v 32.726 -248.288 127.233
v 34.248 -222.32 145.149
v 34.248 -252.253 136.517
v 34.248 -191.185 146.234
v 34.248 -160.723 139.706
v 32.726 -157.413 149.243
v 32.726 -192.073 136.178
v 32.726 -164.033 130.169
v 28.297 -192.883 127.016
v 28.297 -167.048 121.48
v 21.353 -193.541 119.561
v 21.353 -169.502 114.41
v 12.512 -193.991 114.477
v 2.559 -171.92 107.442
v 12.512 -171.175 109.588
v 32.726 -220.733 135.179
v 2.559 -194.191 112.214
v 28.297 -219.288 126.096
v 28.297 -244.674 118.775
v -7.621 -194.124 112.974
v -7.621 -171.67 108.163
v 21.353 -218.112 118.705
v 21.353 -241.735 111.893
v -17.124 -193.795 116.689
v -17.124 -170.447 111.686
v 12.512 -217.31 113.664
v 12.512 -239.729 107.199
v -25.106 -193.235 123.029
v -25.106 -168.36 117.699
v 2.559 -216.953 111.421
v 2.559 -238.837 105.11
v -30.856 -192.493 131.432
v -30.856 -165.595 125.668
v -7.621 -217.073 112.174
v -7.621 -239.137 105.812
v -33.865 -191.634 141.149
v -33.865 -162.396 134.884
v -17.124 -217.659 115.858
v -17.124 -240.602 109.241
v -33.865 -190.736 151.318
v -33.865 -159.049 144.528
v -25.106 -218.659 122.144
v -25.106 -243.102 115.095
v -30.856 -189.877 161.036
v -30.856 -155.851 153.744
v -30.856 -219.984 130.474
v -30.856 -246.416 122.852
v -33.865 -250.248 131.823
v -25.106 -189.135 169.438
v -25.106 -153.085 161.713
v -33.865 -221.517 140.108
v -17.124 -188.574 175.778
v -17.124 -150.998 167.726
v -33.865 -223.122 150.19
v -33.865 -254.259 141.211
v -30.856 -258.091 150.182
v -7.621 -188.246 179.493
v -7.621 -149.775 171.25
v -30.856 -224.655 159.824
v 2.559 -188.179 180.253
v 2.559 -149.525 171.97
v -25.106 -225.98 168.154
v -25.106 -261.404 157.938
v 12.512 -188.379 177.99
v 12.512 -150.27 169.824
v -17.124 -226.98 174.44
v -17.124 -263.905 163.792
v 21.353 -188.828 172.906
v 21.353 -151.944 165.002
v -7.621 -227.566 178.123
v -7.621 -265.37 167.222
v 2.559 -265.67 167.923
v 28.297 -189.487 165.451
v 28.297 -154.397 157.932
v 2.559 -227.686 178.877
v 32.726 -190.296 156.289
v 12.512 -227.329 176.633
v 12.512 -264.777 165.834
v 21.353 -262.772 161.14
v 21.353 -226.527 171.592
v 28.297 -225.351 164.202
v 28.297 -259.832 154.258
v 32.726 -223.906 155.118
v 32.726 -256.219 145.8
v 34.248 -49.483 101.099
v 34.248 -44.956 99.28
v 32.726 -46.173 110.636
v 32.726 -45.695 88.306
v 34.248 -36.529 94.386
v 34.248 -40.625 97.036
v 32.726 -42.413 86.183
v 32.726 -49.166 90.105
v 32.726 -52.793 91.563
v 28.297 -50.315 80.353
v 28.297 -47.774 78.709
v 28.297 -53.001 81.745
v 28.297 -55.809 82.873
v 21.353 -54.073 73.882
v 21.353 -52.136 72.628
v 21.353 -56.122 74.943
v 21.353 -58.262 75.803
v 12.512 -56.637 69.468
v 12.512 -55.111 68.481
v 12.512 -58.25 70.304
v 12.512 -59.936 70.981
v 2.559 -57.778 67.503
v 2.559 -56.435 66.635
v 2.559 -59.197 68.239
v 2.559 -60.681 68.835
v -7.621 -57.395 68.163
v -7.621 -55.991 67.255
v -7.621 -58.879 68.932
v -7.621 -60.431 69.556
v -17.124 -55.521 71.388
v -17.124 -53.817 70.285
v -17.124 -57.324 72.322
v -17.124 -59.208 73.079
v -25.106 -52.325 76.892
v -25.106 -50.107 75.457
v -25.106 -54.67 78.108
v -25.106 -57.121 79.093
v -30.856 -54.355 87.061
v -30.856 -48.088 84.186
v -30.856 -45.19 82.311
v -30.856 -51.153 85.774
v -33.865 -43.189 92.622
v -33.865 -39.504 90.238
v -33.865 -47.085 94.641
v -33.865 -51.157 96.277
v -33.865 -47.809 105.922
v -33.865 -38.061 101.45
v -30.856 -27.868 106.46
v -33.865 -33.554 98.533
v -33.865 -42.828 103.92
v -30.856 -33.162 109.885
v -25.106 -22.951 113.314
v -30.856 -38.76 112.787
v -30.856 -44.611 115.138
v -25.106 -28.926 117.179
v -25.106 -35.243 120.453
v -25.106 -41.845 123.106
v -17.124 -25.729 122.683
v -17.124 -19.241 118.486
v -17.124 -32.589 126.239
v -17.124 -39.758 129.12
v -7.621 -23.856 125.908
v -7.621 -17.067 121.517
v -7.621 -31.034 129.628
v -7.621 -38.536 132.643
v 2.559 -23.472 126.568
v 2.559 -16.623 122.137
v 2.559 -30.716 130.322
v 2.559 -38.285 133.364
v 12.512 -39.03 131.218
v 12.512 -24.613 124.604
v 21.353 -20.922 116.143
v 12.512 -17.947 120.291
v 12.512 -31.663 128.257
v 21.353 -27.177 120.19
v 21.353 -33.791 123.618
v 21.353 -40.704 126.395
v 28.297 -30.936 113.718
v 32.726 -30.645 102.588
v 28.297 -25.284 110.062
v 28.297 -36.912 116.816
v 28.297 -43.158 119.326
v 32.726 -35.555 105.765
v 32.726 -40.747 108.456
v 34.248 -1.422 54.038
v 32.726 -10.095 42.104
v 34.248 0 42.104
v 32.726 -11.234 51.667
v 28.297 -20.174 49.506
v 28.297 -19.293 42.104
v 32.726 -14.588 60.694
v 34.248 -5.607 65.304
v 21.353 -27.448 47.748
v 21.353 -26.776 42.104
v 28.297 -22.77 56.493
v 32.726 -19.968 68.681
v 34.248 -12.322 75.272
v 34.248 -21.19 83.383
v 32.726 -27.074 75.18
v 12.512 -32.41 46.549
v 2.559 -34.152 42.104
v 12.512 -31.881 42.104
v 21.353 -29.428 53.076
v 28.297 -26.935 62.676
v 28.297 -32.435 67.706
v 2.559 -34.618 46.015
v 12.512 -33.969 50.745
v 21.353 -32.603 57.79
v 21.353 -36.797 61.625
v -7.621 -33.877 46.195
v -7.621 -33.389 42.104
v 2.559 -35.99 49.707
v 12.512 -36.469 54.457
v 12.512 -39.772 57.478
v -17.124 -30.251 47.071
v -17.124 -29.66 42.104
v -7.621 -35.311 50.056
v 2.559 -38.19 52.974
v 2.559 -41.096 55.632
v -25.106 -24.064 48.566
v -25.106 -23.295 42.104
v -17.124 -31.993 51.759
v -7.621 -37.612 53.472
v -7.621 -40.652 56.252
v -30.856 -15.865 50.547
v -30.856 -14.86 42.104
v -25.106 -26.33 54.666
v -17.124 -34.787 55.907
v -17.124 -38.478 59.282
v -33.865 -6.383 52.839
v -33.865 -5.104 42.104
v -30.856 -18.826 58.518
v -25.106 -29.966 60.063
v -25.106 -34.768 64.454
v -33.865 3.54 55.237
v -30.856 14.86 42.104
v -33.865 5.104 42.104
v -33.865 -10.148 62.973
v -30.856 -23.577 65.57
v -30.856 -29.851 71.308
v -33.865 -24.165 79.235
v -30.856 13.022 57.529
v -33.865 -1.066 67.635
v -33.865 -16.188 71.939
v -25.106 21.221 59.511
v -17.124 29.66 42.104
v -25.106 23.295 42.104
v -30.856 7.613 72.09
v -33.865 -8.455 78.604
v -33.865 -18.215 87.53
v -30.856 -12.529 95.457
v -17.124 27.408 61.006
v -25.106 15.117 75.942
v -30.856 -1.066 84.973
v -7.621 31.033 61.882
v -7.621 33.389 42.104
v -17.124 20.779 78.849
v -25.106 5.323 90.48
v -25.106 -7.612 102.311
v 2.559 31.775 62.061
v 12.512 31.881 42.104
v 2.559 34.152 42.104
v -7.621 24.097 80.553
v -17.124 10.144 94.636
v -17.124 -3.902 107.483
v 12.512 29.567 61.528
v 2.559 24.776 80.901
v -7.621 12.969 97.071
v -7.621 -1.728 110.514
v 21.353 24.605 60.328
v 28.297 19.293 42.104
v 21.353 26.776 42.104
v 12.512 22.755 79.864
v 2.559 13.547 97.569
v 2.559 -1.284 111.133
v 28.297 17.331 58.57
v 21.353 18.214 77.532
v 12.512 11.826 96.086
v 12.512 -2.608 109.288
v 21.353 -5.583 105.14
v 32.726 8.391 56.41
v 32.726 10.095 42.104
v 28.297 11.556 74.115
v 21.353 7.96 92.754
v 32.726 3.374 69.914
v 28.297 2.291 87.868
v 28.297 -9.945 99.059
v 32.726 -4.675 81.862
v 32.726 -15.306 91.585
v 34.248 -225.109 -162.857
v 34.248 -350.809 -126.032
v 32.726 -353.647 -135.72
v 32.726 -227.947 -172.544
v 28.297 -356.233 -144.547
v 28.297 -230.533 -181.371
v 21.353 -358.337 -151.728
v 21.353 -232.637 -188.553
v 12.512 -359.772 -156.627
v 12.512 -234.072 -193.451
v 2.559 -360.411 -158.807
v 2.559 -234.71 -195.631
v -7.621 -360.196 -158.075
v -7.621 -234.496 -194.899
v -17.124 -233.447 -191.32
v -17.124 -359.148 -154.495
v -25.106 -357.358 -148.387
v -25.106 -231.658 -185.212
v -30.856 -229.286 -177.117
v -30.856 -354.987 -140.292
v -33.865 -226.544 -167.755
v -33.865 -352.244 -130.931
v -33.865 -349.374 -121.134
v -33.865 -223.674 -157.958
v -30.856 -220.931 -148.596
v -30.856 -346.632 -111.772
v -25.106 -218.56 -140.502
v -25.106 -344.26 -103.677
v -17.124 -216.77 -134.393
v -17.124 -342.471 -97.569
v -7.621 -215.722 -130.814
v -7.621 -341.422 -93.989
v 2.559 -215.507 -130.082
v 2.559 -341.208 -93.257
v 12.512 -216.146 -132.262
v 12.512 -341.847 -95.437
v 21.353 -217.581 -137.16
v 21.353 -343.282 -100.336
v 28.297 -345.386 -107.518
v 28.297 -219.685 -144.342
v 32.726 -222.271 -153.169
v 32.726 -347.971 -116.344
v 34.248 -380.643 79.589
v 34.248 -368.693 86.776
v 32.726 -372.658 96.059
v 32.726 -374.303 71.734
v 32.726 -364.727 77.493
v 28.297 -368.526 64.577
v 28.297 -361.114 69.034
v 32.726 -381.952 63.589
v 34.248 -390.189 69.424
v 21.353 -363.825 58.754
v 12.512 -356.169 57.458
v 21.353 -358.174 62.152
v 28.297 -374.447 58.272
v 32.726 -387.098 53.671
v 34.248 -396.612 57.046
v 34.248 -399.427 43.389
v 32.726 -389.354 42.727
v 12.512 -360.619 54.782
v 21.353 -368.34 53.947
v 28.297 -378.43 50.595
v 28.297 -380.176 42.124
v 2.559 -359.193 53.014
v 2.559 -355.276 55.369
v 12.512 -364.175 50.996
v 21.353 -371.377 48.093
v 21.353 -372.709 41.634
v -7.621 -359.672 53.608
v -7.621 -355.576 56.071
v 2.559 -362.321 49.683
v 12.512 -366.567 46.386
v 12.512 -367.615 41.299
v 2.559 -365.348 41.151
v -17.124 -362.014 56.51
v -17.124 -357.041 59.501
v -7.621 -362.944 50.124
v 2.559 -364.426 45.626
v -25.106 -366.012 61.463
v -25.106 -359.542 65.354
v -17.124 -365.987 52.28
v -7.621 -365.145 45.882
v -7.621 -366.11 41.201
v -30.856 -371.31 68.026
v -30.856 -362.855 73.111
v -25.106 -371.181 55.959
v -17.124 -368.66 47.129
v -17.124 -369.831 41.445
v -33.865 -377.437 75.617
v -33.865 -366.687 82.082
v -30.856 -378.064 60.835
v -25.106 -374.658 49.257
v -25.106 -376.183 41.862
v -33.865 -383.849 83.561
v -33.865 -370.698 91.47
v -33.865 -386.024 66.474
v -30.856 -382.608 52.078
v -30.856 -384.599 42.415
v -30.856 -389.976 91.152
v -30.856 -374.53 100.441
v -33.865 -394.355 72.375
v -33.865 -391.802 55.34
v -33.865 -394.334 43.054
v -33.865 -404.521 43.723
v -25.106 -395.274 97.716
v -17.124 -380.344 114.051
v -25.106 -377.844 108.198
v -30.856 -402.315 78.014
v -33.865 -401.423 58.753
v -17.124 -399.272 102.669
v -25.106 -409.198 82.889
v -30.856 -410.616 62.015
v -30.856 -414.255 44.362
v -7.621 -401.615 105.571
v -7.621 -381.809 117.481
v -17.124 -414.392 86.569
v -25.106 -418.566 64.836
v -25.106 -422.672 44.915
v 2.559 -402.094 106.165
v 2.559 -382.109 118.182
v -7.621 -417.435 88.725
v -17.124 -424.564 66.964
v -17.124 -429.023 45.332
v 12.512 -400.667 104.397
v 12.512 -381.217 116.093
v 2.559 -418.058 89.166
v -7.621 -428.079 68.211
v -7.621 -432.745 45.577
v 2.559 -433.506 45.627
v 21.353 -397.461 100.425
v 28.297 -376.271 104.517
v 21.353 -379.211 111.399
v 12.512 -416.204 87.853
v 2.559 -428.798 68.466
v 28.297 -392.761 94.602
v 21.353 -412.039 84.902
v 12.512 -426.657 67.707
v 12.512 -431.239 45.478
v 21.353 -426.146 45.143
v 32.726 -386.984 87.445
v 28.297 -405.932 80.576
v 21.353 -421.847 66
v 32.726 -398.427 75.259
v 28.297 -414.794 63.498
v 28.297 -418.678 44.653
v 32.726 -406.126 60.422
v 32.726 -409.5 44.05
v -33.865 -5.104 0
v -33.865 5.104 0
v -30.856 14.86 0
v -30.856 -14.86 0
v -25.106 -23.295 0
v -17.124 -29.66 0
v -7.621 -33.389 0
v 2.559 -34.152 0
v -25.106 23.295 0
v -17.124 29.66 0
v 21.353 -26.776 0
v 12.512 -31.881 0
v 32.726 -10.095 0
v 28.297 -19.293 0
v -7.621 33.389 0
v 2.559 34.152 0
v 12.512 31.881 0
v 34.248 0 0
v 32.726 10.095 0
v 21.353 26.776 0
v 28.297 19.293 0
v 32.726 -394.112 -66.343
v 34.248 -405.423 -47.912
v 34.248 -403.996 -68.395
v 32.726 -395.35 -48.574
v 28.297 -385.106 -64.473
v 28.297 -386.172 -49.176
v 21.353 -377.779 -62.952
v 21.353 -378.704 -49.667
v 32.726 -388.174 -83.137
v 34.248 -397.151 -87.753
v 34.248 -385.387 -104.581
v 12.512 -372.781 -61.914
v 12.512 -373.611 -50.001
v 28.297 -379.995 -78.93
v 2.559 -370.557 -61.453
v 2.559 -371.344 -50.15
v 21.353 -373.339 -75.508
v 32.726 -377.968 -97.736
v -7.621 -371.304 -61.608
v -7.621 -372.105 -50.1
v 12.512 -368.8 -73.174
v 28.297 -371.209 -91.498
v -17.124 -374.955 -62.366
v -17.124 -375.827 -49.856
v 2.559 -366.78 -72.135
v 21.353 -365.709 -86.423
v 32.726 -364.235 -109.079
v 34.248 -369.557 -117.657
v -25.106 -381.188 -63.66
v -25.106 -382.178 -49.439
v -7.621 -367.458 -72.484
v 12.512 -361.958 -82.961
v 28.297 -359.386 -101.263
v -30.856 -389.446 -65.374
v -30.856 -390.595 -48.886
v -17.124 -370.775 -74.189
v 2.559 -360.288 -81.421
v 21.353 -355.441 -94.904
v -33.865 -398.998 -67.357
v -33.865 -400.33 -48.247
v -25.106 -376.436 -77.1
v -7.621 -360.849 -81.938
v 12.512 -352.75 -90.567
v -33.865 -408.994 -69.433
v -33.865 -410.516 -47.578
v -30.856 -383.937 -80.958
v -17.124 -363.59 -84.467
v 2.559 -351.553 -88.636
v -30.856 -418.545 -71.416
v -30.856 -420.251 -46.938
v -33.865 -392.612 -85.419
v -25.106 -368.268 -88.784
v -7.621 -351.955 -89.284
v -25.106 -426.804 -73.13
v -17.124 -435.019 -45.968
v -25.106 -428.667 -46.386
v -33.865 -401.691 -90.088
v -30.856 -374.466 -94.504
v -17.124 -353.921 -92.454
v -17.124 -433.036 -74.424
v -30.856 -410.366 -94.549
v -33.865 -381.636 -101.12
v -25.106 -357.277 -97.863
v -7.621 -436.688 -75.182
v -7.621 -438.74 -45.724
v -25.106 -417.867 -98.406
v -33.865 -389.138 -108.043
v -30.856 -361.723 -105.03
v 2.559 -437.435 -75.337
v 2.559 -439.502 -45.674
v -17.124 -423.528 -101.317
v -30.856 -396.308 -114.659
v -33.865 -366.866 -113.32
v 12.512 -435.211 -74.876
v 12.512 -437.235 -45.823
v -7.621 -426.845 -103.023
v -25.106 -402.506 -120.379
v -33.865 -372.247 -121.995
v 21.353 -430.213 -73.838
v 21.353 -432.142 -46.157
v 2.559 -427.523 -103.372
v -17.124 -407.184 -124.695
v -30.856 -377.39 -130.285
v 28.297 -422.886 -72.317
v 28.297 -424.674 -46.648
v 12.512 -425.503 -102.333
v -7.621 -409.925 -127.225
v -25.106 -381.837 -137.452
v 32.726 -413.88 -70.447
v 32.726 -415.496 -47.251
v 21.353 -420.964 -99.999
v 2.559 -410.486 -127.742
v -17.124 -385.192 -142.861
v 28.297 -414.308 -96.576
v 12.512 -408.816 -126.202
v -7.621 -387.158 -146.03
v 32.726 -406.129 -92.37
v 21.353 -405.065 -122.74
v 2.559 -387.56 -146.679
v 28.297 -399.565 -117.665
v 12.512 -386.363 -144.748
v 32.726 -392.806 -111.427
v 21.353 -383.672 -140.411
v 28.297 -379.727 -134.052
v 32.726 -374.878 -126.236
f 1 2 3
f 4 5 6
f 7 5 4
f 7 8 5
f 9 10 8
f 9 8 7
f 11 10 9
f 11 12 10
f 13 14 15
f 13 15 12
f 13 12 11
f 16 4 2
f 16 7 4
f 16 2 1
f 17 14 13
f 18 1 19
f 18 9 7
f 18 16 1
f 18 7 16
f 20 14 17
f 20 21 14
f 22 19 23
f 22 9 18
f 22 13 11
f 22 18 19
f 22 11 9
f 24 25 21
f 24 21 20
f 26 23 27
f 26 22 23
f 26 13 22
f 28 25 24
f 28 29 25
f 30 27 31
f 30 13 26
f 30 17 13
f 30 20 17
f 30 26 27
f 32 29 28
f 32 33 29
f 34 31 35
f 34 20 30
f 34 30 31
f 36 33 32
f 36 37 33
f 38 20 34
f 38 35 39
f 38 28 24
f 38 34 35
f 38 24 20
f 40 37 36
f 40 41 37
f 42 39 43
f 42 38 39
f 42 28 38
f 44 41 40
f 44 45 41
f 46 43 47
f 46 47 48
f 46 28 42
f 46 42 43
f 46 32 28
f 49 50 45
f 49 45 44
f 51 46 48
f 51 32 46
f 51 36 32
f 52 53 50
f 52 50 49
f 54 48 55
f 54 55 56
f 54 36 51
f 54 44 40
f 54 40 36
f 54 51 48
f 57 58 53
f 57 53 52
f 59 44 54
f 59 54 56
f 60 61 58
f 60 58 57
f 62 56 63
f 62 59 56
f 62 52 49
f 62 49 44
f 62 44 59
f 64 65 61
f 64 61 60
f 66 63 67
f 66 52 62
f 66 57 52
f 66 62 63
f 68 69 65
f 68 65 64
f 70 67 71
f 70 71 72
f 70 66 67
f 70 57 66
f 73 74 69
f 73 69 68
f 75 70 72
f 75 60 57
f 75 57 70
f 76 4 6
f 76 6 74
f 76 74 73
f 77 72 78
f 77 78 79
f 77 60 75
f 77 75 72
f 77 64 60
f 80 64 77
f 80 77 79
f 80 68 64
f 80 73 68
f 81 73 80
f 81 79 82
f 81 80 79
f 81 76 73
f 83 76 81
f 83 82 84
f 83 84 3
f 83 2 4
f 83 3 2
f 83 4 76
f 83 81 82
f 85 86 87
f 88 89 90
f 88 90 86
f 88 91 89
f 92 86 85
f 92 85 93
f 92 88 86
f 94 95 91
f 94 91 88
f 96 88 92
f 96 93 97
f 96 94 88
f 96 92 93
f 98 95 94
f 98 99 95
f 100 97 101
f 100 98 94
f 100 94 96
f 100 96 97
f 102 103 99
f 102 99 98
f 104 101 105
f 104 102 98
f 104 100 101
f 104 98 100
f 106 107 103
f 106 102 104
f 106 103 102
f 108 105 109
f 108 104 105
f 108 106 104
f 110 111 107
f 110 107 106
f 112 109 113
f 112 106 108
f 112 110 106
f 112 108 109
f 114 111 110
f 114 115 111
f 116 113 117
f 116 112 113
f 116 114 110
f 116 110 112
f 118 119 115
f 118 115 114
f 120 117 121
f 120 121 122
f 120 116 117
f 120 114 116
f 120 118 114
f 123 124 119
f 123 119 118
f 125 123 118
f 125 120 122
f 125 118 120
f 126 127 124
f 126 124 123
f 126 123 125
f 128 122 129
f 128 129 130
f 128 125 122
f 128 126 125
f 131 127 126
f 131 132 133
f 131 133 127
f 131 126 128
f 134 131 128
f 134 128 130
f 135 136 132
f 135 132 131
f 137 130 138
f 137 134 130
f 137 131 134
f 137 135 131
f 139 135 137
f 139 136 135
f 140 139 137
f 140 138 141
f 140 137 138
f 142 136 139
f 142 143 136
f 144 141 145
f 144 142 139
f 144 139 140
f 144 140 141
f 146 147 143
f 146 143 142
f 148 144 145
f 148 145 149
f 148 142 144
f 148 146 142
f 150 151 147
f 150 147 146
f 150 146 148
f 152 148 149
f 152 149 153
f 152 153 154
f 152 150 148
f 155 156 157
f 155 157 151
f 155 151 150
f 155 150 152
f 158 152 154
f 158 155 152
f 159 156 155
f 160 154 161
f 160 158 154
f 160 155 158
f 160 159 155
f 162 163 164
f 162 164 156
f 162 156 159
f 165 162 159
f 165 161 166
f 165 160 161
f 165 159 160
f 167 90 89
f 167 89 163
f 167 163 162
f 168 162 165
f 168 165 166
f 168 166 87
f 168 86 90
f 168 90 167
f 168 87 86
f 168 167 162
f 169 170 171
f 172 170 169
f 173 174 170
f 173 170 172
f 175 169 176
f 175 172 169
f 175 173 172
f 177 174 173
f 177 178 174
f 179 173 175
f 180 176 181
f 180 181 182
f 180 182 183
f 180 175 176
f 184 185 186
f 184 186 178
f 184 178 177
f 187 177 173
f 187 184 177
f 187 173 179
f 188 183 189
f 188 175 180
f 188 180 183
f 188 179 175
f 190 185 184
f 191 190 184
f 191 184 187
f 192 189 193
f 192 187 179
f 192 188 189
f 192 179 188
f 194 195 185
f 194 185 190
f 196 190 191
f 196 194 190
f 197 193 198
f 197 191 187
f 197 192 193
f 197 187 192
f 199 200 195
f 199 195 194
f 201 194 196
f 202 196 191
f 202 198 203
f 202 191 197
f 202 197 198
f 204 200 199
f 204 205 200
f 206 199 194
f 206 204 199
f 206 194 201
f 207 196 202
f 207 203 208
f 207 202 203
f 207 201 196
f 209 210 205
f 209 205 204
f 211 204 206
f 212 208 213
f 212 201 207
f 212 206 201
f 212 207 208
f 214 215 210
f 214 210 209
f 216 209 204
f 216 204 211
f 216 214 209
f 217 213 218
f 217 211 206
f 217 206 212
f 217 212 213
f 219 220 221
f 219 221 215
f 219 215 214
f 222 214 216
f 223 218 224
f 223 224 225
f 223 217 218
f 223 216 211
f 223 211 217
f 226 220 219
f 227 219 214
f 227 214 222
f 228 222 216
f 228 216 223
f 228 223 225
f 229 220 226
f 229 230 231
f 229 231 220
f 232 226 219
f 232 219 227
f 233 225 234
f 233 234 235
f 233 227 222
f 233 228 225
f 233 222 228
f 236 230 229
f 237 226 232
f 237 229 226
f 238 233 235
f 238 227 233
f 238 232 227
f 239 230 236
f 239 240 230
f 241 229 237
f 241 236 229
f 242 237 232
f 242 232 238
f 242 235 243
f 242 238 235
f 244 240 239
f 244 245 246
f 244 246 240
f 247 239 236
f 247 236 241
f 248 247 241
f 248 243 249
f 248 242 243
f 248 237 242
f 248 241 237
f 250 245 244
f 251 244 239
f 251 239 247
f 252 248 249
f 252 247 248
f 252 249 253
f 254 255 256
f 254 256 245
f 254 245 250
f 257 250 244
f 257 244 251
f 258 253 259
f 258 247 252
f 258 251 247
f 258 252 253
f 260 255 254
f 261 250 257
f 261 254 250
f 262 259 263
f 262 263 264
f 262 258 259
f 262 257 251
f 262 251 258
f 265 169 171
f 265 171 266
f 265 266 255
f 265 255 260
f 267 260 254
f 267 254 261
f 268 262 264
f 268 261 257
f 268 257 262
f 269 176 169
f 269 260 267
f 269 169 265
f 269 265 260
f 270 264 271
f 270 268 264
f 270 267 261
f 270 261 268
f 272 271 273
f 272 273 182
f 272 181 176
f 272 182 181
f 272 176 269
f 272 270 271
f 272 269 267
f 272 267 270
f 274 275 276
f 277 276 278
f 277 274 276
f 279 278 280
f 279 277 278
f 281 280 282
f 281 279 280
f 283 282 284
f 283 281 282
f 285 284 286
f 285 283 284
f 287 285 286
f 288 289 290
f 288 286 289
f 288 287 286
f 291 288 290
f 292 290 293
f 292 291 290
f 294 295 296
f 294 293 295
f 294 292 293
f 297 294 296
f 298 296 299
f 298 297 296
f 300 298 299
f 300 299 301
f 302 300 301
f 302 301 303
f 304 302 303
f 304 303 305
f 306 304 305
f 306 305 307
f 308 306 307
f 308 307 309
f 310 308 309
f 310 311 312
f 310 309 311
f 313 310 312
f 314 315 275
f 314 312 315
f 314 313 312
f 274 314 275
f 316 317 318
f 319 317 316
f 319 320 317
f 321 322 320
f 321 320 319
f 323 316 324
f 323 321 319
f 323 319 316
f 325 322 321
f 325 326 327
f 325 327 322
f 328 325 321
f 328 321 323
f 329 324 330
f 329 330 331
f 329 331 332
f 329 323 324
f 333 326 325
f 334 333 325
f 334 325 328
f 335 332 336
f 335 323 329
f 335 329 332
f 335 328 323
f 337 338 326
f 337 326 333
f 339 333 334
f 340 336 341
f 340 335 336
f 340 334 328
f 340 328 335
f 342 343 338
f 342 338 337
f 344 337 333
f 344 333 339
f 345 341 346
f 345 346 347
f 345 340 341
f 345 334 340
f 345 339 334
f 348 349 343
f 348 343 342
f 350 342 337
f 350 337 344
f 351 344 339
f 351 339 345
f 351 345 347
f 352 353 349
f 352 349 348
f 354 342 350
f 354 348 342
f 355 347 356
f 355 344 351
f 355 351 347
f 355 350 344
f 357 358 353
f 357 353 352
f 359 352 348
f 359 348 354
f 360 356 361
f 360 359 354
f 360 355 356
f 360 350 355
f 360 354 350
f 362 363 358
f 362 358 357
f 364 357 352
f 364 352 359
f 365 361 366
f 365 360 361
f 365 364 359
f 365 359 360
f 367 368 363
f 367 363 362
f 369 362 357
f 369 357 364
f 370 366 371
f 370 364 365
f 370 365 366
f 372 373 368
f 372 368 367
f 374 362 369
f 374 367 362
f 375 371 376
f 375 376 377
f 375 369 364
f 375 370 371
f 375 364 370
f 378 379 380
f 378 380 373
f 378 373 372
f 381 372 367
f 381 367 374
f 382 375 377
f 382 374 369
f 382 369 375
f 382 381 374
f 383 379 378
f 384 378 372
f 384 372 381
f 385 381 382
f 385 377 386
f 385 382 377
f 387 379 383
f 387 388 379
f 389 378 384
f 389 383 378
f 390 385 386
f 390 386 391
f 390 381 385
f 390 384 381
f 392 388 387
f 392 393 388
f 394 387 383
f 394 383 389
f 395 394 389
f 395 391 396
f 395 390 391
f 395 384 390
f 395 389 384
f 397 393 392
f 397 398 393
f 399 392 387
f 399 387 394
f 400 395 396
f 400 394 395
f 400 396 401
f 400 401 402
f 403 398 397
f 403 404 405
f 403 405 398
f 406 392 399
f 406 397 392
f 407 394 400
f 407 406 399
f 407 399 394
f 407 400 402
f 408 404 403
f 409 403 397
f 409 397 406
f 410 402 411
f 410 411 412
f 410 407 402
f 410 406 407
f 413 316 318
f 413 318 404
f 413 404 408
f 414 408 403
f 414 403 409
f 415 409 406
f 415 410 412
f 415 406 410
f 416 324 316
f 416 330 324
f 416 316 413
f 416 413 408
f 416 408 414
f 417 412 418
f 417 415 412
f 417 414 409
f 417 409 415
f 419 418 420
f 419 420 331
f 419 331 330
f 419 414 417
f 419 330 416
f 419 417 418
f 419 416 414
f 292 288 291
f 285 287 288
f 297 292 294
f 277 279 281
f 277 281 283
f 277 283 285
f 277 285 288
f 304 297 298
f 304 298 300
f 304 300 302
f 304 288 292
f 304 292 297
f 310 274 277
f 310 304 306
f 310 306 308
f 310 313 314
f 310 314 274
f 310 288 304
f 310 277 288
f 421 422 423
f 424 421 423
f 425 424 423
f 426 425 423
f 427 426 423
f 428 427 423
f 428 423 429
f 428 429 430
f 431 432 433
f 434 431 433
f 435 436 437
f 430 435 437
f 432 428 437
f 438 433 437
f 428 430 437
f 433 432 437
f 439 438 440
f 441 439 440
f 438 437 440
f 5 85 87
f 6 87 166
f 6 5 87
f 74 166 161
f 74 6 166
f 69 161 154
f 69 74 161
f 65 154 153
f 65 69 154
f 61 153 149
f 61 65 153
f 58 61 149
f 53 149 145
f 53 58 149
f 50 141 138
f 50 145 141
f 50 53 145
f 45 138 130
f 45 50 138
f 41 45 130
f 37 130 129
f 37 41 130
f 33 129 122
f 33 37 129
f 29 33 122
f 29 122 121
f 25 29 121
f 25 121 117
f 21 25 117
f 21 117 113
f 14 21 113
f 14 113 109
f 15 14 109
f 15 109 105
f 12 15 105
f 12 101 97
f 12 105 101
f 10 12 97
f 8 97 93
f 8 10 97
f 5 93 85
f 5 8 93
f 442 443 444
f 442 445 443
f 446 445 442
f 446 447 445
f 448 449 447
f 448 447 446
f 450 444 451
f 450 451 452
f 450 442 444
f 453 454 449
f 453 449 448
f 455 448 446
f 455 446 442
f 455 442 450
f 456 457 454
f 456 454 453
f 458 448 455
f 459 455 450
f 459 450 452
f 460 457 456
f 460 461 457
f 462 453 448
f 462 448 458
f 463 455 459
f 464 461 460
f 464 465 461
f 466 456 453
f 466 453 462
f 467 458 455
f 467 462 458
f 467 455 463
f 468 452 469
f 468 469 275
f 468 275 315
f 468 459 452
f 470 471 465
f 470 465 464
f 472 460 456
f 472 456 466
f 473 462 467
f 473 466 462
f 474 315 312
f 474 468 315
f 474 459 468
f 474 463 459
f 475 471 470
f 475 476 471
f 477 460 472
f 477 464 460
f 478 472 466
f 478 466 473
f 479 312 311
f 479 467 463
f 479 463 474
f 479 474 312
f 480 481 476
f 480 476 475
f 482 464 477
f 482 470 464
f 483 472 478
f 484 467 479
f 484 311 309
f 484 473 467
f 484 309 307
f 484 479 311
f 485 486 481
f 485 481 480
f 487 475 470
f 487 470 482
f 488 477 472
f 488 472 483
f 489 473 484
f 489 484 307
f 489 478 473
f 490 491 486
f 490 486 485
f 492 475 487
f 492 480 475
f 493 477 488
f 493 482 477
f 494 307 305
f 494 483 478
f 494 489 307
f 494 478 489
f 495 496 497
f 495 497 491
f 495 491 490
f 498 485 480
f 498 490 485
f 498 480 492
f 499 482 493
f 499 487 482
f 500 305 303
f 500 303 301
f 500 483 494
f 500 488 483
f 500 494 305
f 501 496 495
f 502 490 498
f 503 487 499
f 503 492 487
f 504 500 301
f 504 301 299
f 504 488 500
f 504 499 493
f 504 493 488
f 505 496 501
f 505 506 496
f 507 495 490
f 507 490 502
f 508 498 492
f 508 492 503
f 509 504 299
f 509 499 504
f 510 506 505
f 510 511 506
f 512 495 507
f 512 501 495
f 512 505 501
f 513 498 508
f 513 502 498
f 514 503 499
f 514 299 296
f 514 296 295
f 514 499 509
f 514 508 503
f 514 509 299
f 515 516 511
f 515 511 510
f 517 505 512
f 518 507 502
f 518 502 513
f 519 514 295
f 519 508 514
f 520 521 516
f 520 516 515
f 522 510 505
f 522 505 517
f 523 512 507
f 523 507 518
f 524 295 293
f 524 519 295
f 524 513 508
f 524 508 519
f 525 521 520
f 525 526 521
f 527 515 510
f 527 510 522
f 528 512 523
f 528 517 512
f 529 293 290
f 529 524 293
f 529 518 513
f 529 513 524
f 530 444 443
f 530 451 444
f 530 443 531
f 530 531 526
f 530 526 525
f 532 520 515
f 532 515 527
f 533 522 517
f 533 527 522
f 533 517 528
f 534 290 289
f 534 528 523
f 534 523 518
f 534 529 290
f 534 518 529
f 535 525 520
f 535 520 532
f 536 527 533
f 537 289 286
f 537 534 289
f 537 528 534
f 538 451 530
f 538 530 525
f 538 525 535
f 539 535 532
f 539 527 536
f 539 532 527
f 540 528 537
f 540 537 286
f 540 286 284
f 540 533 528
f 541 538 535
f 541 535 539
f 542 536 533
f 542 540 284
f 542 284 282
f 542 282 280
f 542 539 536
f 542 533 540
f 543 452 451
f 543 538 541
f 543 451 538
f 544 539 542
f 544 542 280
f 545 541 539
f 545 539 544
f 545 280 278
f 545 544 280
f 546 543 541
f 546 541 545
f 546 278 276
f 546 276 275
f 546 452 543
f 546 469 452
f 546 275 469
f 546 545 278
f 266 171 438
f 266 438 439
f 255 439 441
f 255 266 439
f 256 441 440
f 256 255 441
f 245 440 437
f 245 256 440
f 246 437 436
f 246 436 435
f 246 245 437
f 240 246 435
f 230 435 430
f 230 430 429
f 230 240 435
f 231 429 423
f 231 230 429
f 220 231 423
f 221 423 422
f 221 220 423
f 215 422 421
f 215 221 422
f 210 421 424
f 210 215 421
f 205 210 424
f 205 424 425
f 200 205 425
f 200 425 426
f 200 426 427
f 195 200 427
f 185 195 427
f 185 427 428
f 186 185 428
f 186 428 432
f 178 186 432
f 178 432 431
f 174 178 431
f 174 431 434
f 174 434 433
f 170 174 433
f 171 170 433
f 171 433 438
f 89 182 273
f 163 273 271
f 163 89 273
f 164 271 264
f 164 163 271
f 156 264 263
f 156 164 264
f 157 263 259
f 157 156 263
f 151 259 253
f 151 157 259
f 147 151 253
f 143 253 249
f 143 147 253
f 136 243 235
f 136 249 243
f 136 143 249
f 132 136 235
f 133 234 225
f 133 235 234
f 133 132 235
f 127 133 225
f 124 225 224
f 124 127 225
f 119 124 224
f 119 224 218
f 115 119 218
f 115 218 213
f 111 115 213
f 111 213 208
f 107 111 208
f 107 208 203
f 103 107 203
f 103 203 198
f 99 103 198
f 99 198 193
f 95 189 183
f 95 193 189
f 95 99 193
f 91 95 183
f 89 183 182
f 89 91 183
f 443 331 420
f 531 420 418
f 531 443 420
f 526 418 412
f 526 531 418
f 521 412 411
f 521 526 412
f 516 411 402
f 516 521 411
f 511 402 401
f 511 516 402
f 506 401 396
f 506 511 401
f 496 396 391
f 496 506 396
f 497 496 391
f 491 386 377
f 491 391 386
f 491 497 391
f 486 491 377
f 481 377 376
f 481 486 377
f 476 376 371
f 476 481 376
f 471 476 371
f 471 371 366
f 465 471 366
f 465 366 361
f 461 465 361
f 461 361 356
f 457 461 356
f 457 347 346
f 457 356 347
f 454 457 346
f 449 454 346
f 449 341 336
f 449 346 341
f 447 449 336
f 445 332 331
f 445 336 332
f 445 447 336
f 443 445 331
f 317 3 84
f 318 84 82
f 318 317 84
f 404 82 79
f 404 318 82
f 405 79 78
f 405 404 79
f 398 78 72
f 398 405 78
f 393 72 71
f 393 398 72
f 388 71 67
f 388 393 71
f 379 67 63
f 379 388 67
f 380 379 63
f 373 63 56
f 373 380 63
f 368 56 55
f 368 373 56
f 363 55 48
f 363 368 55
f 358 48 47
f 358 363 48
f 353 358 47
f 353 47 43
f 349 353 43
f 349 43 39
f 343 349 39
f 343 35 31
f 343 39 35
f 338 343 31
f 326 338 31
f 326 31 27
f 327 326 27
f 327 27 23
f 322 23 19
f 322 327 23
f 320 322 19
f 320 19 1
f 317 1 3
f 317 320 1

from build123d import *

# Parameters (mm, degrees)
F0_R = 34.2479621902


with BuildPart() as f2:
    # F2: sweep along a path in F1
    with BuildLine(Plane.YZ) as f2_path:
        Line((0, 0), (0, 42.1044450237))
        ThreePointArc((0, 42.1044450237), (-5.6069266237, 65.3041458582), (-21.1900046775, 83.3826254221))
        Line((-21.1900046775, 83.3826254221), (-36.5290609103, 94.3857602241))
        ThreePointArc((-36.5290609103, 94.3857602241), (-42.763778711, 98.2100897423), (-49.4830708618, 101.0994348776))
        Line((-49.4830708618, 101.0994348776), (-160.7226986152, 139.7061028327))
        ThreePointArc((-160.7226986152, 139.7061028327), (-206.7855450766, 146.6494265049), (-252.25333688, 136.5165356896))
        Line((-252.25333688, 136.5165356896), (-368.6925900292, 86.7757238812))
        ThreePointArc((-368.6925900292, 86.7757238812), (-390.1894627935, 69.4242484731), (-399.4271314968, 43.3886053197))
        Line((-399.4271314968, 43.3886053197), (-405.4229263948, -47.9120732419))
        ThreePointArc((-405.4229263948, -47.9120732419), (-391.8386577153, -96.5654209485), (-350.8094442607, -126.0320841785))
        Line((-350.8094442607, -126.0320841785), (-225.1088500457, -162.8565612302))
    # F0 (on Top) → F2 (sweep)
    with BuildSketch(Plane.XY):
        Circle(F0_R)
    sweep(path=f2_path.line)


solid = f2.part
